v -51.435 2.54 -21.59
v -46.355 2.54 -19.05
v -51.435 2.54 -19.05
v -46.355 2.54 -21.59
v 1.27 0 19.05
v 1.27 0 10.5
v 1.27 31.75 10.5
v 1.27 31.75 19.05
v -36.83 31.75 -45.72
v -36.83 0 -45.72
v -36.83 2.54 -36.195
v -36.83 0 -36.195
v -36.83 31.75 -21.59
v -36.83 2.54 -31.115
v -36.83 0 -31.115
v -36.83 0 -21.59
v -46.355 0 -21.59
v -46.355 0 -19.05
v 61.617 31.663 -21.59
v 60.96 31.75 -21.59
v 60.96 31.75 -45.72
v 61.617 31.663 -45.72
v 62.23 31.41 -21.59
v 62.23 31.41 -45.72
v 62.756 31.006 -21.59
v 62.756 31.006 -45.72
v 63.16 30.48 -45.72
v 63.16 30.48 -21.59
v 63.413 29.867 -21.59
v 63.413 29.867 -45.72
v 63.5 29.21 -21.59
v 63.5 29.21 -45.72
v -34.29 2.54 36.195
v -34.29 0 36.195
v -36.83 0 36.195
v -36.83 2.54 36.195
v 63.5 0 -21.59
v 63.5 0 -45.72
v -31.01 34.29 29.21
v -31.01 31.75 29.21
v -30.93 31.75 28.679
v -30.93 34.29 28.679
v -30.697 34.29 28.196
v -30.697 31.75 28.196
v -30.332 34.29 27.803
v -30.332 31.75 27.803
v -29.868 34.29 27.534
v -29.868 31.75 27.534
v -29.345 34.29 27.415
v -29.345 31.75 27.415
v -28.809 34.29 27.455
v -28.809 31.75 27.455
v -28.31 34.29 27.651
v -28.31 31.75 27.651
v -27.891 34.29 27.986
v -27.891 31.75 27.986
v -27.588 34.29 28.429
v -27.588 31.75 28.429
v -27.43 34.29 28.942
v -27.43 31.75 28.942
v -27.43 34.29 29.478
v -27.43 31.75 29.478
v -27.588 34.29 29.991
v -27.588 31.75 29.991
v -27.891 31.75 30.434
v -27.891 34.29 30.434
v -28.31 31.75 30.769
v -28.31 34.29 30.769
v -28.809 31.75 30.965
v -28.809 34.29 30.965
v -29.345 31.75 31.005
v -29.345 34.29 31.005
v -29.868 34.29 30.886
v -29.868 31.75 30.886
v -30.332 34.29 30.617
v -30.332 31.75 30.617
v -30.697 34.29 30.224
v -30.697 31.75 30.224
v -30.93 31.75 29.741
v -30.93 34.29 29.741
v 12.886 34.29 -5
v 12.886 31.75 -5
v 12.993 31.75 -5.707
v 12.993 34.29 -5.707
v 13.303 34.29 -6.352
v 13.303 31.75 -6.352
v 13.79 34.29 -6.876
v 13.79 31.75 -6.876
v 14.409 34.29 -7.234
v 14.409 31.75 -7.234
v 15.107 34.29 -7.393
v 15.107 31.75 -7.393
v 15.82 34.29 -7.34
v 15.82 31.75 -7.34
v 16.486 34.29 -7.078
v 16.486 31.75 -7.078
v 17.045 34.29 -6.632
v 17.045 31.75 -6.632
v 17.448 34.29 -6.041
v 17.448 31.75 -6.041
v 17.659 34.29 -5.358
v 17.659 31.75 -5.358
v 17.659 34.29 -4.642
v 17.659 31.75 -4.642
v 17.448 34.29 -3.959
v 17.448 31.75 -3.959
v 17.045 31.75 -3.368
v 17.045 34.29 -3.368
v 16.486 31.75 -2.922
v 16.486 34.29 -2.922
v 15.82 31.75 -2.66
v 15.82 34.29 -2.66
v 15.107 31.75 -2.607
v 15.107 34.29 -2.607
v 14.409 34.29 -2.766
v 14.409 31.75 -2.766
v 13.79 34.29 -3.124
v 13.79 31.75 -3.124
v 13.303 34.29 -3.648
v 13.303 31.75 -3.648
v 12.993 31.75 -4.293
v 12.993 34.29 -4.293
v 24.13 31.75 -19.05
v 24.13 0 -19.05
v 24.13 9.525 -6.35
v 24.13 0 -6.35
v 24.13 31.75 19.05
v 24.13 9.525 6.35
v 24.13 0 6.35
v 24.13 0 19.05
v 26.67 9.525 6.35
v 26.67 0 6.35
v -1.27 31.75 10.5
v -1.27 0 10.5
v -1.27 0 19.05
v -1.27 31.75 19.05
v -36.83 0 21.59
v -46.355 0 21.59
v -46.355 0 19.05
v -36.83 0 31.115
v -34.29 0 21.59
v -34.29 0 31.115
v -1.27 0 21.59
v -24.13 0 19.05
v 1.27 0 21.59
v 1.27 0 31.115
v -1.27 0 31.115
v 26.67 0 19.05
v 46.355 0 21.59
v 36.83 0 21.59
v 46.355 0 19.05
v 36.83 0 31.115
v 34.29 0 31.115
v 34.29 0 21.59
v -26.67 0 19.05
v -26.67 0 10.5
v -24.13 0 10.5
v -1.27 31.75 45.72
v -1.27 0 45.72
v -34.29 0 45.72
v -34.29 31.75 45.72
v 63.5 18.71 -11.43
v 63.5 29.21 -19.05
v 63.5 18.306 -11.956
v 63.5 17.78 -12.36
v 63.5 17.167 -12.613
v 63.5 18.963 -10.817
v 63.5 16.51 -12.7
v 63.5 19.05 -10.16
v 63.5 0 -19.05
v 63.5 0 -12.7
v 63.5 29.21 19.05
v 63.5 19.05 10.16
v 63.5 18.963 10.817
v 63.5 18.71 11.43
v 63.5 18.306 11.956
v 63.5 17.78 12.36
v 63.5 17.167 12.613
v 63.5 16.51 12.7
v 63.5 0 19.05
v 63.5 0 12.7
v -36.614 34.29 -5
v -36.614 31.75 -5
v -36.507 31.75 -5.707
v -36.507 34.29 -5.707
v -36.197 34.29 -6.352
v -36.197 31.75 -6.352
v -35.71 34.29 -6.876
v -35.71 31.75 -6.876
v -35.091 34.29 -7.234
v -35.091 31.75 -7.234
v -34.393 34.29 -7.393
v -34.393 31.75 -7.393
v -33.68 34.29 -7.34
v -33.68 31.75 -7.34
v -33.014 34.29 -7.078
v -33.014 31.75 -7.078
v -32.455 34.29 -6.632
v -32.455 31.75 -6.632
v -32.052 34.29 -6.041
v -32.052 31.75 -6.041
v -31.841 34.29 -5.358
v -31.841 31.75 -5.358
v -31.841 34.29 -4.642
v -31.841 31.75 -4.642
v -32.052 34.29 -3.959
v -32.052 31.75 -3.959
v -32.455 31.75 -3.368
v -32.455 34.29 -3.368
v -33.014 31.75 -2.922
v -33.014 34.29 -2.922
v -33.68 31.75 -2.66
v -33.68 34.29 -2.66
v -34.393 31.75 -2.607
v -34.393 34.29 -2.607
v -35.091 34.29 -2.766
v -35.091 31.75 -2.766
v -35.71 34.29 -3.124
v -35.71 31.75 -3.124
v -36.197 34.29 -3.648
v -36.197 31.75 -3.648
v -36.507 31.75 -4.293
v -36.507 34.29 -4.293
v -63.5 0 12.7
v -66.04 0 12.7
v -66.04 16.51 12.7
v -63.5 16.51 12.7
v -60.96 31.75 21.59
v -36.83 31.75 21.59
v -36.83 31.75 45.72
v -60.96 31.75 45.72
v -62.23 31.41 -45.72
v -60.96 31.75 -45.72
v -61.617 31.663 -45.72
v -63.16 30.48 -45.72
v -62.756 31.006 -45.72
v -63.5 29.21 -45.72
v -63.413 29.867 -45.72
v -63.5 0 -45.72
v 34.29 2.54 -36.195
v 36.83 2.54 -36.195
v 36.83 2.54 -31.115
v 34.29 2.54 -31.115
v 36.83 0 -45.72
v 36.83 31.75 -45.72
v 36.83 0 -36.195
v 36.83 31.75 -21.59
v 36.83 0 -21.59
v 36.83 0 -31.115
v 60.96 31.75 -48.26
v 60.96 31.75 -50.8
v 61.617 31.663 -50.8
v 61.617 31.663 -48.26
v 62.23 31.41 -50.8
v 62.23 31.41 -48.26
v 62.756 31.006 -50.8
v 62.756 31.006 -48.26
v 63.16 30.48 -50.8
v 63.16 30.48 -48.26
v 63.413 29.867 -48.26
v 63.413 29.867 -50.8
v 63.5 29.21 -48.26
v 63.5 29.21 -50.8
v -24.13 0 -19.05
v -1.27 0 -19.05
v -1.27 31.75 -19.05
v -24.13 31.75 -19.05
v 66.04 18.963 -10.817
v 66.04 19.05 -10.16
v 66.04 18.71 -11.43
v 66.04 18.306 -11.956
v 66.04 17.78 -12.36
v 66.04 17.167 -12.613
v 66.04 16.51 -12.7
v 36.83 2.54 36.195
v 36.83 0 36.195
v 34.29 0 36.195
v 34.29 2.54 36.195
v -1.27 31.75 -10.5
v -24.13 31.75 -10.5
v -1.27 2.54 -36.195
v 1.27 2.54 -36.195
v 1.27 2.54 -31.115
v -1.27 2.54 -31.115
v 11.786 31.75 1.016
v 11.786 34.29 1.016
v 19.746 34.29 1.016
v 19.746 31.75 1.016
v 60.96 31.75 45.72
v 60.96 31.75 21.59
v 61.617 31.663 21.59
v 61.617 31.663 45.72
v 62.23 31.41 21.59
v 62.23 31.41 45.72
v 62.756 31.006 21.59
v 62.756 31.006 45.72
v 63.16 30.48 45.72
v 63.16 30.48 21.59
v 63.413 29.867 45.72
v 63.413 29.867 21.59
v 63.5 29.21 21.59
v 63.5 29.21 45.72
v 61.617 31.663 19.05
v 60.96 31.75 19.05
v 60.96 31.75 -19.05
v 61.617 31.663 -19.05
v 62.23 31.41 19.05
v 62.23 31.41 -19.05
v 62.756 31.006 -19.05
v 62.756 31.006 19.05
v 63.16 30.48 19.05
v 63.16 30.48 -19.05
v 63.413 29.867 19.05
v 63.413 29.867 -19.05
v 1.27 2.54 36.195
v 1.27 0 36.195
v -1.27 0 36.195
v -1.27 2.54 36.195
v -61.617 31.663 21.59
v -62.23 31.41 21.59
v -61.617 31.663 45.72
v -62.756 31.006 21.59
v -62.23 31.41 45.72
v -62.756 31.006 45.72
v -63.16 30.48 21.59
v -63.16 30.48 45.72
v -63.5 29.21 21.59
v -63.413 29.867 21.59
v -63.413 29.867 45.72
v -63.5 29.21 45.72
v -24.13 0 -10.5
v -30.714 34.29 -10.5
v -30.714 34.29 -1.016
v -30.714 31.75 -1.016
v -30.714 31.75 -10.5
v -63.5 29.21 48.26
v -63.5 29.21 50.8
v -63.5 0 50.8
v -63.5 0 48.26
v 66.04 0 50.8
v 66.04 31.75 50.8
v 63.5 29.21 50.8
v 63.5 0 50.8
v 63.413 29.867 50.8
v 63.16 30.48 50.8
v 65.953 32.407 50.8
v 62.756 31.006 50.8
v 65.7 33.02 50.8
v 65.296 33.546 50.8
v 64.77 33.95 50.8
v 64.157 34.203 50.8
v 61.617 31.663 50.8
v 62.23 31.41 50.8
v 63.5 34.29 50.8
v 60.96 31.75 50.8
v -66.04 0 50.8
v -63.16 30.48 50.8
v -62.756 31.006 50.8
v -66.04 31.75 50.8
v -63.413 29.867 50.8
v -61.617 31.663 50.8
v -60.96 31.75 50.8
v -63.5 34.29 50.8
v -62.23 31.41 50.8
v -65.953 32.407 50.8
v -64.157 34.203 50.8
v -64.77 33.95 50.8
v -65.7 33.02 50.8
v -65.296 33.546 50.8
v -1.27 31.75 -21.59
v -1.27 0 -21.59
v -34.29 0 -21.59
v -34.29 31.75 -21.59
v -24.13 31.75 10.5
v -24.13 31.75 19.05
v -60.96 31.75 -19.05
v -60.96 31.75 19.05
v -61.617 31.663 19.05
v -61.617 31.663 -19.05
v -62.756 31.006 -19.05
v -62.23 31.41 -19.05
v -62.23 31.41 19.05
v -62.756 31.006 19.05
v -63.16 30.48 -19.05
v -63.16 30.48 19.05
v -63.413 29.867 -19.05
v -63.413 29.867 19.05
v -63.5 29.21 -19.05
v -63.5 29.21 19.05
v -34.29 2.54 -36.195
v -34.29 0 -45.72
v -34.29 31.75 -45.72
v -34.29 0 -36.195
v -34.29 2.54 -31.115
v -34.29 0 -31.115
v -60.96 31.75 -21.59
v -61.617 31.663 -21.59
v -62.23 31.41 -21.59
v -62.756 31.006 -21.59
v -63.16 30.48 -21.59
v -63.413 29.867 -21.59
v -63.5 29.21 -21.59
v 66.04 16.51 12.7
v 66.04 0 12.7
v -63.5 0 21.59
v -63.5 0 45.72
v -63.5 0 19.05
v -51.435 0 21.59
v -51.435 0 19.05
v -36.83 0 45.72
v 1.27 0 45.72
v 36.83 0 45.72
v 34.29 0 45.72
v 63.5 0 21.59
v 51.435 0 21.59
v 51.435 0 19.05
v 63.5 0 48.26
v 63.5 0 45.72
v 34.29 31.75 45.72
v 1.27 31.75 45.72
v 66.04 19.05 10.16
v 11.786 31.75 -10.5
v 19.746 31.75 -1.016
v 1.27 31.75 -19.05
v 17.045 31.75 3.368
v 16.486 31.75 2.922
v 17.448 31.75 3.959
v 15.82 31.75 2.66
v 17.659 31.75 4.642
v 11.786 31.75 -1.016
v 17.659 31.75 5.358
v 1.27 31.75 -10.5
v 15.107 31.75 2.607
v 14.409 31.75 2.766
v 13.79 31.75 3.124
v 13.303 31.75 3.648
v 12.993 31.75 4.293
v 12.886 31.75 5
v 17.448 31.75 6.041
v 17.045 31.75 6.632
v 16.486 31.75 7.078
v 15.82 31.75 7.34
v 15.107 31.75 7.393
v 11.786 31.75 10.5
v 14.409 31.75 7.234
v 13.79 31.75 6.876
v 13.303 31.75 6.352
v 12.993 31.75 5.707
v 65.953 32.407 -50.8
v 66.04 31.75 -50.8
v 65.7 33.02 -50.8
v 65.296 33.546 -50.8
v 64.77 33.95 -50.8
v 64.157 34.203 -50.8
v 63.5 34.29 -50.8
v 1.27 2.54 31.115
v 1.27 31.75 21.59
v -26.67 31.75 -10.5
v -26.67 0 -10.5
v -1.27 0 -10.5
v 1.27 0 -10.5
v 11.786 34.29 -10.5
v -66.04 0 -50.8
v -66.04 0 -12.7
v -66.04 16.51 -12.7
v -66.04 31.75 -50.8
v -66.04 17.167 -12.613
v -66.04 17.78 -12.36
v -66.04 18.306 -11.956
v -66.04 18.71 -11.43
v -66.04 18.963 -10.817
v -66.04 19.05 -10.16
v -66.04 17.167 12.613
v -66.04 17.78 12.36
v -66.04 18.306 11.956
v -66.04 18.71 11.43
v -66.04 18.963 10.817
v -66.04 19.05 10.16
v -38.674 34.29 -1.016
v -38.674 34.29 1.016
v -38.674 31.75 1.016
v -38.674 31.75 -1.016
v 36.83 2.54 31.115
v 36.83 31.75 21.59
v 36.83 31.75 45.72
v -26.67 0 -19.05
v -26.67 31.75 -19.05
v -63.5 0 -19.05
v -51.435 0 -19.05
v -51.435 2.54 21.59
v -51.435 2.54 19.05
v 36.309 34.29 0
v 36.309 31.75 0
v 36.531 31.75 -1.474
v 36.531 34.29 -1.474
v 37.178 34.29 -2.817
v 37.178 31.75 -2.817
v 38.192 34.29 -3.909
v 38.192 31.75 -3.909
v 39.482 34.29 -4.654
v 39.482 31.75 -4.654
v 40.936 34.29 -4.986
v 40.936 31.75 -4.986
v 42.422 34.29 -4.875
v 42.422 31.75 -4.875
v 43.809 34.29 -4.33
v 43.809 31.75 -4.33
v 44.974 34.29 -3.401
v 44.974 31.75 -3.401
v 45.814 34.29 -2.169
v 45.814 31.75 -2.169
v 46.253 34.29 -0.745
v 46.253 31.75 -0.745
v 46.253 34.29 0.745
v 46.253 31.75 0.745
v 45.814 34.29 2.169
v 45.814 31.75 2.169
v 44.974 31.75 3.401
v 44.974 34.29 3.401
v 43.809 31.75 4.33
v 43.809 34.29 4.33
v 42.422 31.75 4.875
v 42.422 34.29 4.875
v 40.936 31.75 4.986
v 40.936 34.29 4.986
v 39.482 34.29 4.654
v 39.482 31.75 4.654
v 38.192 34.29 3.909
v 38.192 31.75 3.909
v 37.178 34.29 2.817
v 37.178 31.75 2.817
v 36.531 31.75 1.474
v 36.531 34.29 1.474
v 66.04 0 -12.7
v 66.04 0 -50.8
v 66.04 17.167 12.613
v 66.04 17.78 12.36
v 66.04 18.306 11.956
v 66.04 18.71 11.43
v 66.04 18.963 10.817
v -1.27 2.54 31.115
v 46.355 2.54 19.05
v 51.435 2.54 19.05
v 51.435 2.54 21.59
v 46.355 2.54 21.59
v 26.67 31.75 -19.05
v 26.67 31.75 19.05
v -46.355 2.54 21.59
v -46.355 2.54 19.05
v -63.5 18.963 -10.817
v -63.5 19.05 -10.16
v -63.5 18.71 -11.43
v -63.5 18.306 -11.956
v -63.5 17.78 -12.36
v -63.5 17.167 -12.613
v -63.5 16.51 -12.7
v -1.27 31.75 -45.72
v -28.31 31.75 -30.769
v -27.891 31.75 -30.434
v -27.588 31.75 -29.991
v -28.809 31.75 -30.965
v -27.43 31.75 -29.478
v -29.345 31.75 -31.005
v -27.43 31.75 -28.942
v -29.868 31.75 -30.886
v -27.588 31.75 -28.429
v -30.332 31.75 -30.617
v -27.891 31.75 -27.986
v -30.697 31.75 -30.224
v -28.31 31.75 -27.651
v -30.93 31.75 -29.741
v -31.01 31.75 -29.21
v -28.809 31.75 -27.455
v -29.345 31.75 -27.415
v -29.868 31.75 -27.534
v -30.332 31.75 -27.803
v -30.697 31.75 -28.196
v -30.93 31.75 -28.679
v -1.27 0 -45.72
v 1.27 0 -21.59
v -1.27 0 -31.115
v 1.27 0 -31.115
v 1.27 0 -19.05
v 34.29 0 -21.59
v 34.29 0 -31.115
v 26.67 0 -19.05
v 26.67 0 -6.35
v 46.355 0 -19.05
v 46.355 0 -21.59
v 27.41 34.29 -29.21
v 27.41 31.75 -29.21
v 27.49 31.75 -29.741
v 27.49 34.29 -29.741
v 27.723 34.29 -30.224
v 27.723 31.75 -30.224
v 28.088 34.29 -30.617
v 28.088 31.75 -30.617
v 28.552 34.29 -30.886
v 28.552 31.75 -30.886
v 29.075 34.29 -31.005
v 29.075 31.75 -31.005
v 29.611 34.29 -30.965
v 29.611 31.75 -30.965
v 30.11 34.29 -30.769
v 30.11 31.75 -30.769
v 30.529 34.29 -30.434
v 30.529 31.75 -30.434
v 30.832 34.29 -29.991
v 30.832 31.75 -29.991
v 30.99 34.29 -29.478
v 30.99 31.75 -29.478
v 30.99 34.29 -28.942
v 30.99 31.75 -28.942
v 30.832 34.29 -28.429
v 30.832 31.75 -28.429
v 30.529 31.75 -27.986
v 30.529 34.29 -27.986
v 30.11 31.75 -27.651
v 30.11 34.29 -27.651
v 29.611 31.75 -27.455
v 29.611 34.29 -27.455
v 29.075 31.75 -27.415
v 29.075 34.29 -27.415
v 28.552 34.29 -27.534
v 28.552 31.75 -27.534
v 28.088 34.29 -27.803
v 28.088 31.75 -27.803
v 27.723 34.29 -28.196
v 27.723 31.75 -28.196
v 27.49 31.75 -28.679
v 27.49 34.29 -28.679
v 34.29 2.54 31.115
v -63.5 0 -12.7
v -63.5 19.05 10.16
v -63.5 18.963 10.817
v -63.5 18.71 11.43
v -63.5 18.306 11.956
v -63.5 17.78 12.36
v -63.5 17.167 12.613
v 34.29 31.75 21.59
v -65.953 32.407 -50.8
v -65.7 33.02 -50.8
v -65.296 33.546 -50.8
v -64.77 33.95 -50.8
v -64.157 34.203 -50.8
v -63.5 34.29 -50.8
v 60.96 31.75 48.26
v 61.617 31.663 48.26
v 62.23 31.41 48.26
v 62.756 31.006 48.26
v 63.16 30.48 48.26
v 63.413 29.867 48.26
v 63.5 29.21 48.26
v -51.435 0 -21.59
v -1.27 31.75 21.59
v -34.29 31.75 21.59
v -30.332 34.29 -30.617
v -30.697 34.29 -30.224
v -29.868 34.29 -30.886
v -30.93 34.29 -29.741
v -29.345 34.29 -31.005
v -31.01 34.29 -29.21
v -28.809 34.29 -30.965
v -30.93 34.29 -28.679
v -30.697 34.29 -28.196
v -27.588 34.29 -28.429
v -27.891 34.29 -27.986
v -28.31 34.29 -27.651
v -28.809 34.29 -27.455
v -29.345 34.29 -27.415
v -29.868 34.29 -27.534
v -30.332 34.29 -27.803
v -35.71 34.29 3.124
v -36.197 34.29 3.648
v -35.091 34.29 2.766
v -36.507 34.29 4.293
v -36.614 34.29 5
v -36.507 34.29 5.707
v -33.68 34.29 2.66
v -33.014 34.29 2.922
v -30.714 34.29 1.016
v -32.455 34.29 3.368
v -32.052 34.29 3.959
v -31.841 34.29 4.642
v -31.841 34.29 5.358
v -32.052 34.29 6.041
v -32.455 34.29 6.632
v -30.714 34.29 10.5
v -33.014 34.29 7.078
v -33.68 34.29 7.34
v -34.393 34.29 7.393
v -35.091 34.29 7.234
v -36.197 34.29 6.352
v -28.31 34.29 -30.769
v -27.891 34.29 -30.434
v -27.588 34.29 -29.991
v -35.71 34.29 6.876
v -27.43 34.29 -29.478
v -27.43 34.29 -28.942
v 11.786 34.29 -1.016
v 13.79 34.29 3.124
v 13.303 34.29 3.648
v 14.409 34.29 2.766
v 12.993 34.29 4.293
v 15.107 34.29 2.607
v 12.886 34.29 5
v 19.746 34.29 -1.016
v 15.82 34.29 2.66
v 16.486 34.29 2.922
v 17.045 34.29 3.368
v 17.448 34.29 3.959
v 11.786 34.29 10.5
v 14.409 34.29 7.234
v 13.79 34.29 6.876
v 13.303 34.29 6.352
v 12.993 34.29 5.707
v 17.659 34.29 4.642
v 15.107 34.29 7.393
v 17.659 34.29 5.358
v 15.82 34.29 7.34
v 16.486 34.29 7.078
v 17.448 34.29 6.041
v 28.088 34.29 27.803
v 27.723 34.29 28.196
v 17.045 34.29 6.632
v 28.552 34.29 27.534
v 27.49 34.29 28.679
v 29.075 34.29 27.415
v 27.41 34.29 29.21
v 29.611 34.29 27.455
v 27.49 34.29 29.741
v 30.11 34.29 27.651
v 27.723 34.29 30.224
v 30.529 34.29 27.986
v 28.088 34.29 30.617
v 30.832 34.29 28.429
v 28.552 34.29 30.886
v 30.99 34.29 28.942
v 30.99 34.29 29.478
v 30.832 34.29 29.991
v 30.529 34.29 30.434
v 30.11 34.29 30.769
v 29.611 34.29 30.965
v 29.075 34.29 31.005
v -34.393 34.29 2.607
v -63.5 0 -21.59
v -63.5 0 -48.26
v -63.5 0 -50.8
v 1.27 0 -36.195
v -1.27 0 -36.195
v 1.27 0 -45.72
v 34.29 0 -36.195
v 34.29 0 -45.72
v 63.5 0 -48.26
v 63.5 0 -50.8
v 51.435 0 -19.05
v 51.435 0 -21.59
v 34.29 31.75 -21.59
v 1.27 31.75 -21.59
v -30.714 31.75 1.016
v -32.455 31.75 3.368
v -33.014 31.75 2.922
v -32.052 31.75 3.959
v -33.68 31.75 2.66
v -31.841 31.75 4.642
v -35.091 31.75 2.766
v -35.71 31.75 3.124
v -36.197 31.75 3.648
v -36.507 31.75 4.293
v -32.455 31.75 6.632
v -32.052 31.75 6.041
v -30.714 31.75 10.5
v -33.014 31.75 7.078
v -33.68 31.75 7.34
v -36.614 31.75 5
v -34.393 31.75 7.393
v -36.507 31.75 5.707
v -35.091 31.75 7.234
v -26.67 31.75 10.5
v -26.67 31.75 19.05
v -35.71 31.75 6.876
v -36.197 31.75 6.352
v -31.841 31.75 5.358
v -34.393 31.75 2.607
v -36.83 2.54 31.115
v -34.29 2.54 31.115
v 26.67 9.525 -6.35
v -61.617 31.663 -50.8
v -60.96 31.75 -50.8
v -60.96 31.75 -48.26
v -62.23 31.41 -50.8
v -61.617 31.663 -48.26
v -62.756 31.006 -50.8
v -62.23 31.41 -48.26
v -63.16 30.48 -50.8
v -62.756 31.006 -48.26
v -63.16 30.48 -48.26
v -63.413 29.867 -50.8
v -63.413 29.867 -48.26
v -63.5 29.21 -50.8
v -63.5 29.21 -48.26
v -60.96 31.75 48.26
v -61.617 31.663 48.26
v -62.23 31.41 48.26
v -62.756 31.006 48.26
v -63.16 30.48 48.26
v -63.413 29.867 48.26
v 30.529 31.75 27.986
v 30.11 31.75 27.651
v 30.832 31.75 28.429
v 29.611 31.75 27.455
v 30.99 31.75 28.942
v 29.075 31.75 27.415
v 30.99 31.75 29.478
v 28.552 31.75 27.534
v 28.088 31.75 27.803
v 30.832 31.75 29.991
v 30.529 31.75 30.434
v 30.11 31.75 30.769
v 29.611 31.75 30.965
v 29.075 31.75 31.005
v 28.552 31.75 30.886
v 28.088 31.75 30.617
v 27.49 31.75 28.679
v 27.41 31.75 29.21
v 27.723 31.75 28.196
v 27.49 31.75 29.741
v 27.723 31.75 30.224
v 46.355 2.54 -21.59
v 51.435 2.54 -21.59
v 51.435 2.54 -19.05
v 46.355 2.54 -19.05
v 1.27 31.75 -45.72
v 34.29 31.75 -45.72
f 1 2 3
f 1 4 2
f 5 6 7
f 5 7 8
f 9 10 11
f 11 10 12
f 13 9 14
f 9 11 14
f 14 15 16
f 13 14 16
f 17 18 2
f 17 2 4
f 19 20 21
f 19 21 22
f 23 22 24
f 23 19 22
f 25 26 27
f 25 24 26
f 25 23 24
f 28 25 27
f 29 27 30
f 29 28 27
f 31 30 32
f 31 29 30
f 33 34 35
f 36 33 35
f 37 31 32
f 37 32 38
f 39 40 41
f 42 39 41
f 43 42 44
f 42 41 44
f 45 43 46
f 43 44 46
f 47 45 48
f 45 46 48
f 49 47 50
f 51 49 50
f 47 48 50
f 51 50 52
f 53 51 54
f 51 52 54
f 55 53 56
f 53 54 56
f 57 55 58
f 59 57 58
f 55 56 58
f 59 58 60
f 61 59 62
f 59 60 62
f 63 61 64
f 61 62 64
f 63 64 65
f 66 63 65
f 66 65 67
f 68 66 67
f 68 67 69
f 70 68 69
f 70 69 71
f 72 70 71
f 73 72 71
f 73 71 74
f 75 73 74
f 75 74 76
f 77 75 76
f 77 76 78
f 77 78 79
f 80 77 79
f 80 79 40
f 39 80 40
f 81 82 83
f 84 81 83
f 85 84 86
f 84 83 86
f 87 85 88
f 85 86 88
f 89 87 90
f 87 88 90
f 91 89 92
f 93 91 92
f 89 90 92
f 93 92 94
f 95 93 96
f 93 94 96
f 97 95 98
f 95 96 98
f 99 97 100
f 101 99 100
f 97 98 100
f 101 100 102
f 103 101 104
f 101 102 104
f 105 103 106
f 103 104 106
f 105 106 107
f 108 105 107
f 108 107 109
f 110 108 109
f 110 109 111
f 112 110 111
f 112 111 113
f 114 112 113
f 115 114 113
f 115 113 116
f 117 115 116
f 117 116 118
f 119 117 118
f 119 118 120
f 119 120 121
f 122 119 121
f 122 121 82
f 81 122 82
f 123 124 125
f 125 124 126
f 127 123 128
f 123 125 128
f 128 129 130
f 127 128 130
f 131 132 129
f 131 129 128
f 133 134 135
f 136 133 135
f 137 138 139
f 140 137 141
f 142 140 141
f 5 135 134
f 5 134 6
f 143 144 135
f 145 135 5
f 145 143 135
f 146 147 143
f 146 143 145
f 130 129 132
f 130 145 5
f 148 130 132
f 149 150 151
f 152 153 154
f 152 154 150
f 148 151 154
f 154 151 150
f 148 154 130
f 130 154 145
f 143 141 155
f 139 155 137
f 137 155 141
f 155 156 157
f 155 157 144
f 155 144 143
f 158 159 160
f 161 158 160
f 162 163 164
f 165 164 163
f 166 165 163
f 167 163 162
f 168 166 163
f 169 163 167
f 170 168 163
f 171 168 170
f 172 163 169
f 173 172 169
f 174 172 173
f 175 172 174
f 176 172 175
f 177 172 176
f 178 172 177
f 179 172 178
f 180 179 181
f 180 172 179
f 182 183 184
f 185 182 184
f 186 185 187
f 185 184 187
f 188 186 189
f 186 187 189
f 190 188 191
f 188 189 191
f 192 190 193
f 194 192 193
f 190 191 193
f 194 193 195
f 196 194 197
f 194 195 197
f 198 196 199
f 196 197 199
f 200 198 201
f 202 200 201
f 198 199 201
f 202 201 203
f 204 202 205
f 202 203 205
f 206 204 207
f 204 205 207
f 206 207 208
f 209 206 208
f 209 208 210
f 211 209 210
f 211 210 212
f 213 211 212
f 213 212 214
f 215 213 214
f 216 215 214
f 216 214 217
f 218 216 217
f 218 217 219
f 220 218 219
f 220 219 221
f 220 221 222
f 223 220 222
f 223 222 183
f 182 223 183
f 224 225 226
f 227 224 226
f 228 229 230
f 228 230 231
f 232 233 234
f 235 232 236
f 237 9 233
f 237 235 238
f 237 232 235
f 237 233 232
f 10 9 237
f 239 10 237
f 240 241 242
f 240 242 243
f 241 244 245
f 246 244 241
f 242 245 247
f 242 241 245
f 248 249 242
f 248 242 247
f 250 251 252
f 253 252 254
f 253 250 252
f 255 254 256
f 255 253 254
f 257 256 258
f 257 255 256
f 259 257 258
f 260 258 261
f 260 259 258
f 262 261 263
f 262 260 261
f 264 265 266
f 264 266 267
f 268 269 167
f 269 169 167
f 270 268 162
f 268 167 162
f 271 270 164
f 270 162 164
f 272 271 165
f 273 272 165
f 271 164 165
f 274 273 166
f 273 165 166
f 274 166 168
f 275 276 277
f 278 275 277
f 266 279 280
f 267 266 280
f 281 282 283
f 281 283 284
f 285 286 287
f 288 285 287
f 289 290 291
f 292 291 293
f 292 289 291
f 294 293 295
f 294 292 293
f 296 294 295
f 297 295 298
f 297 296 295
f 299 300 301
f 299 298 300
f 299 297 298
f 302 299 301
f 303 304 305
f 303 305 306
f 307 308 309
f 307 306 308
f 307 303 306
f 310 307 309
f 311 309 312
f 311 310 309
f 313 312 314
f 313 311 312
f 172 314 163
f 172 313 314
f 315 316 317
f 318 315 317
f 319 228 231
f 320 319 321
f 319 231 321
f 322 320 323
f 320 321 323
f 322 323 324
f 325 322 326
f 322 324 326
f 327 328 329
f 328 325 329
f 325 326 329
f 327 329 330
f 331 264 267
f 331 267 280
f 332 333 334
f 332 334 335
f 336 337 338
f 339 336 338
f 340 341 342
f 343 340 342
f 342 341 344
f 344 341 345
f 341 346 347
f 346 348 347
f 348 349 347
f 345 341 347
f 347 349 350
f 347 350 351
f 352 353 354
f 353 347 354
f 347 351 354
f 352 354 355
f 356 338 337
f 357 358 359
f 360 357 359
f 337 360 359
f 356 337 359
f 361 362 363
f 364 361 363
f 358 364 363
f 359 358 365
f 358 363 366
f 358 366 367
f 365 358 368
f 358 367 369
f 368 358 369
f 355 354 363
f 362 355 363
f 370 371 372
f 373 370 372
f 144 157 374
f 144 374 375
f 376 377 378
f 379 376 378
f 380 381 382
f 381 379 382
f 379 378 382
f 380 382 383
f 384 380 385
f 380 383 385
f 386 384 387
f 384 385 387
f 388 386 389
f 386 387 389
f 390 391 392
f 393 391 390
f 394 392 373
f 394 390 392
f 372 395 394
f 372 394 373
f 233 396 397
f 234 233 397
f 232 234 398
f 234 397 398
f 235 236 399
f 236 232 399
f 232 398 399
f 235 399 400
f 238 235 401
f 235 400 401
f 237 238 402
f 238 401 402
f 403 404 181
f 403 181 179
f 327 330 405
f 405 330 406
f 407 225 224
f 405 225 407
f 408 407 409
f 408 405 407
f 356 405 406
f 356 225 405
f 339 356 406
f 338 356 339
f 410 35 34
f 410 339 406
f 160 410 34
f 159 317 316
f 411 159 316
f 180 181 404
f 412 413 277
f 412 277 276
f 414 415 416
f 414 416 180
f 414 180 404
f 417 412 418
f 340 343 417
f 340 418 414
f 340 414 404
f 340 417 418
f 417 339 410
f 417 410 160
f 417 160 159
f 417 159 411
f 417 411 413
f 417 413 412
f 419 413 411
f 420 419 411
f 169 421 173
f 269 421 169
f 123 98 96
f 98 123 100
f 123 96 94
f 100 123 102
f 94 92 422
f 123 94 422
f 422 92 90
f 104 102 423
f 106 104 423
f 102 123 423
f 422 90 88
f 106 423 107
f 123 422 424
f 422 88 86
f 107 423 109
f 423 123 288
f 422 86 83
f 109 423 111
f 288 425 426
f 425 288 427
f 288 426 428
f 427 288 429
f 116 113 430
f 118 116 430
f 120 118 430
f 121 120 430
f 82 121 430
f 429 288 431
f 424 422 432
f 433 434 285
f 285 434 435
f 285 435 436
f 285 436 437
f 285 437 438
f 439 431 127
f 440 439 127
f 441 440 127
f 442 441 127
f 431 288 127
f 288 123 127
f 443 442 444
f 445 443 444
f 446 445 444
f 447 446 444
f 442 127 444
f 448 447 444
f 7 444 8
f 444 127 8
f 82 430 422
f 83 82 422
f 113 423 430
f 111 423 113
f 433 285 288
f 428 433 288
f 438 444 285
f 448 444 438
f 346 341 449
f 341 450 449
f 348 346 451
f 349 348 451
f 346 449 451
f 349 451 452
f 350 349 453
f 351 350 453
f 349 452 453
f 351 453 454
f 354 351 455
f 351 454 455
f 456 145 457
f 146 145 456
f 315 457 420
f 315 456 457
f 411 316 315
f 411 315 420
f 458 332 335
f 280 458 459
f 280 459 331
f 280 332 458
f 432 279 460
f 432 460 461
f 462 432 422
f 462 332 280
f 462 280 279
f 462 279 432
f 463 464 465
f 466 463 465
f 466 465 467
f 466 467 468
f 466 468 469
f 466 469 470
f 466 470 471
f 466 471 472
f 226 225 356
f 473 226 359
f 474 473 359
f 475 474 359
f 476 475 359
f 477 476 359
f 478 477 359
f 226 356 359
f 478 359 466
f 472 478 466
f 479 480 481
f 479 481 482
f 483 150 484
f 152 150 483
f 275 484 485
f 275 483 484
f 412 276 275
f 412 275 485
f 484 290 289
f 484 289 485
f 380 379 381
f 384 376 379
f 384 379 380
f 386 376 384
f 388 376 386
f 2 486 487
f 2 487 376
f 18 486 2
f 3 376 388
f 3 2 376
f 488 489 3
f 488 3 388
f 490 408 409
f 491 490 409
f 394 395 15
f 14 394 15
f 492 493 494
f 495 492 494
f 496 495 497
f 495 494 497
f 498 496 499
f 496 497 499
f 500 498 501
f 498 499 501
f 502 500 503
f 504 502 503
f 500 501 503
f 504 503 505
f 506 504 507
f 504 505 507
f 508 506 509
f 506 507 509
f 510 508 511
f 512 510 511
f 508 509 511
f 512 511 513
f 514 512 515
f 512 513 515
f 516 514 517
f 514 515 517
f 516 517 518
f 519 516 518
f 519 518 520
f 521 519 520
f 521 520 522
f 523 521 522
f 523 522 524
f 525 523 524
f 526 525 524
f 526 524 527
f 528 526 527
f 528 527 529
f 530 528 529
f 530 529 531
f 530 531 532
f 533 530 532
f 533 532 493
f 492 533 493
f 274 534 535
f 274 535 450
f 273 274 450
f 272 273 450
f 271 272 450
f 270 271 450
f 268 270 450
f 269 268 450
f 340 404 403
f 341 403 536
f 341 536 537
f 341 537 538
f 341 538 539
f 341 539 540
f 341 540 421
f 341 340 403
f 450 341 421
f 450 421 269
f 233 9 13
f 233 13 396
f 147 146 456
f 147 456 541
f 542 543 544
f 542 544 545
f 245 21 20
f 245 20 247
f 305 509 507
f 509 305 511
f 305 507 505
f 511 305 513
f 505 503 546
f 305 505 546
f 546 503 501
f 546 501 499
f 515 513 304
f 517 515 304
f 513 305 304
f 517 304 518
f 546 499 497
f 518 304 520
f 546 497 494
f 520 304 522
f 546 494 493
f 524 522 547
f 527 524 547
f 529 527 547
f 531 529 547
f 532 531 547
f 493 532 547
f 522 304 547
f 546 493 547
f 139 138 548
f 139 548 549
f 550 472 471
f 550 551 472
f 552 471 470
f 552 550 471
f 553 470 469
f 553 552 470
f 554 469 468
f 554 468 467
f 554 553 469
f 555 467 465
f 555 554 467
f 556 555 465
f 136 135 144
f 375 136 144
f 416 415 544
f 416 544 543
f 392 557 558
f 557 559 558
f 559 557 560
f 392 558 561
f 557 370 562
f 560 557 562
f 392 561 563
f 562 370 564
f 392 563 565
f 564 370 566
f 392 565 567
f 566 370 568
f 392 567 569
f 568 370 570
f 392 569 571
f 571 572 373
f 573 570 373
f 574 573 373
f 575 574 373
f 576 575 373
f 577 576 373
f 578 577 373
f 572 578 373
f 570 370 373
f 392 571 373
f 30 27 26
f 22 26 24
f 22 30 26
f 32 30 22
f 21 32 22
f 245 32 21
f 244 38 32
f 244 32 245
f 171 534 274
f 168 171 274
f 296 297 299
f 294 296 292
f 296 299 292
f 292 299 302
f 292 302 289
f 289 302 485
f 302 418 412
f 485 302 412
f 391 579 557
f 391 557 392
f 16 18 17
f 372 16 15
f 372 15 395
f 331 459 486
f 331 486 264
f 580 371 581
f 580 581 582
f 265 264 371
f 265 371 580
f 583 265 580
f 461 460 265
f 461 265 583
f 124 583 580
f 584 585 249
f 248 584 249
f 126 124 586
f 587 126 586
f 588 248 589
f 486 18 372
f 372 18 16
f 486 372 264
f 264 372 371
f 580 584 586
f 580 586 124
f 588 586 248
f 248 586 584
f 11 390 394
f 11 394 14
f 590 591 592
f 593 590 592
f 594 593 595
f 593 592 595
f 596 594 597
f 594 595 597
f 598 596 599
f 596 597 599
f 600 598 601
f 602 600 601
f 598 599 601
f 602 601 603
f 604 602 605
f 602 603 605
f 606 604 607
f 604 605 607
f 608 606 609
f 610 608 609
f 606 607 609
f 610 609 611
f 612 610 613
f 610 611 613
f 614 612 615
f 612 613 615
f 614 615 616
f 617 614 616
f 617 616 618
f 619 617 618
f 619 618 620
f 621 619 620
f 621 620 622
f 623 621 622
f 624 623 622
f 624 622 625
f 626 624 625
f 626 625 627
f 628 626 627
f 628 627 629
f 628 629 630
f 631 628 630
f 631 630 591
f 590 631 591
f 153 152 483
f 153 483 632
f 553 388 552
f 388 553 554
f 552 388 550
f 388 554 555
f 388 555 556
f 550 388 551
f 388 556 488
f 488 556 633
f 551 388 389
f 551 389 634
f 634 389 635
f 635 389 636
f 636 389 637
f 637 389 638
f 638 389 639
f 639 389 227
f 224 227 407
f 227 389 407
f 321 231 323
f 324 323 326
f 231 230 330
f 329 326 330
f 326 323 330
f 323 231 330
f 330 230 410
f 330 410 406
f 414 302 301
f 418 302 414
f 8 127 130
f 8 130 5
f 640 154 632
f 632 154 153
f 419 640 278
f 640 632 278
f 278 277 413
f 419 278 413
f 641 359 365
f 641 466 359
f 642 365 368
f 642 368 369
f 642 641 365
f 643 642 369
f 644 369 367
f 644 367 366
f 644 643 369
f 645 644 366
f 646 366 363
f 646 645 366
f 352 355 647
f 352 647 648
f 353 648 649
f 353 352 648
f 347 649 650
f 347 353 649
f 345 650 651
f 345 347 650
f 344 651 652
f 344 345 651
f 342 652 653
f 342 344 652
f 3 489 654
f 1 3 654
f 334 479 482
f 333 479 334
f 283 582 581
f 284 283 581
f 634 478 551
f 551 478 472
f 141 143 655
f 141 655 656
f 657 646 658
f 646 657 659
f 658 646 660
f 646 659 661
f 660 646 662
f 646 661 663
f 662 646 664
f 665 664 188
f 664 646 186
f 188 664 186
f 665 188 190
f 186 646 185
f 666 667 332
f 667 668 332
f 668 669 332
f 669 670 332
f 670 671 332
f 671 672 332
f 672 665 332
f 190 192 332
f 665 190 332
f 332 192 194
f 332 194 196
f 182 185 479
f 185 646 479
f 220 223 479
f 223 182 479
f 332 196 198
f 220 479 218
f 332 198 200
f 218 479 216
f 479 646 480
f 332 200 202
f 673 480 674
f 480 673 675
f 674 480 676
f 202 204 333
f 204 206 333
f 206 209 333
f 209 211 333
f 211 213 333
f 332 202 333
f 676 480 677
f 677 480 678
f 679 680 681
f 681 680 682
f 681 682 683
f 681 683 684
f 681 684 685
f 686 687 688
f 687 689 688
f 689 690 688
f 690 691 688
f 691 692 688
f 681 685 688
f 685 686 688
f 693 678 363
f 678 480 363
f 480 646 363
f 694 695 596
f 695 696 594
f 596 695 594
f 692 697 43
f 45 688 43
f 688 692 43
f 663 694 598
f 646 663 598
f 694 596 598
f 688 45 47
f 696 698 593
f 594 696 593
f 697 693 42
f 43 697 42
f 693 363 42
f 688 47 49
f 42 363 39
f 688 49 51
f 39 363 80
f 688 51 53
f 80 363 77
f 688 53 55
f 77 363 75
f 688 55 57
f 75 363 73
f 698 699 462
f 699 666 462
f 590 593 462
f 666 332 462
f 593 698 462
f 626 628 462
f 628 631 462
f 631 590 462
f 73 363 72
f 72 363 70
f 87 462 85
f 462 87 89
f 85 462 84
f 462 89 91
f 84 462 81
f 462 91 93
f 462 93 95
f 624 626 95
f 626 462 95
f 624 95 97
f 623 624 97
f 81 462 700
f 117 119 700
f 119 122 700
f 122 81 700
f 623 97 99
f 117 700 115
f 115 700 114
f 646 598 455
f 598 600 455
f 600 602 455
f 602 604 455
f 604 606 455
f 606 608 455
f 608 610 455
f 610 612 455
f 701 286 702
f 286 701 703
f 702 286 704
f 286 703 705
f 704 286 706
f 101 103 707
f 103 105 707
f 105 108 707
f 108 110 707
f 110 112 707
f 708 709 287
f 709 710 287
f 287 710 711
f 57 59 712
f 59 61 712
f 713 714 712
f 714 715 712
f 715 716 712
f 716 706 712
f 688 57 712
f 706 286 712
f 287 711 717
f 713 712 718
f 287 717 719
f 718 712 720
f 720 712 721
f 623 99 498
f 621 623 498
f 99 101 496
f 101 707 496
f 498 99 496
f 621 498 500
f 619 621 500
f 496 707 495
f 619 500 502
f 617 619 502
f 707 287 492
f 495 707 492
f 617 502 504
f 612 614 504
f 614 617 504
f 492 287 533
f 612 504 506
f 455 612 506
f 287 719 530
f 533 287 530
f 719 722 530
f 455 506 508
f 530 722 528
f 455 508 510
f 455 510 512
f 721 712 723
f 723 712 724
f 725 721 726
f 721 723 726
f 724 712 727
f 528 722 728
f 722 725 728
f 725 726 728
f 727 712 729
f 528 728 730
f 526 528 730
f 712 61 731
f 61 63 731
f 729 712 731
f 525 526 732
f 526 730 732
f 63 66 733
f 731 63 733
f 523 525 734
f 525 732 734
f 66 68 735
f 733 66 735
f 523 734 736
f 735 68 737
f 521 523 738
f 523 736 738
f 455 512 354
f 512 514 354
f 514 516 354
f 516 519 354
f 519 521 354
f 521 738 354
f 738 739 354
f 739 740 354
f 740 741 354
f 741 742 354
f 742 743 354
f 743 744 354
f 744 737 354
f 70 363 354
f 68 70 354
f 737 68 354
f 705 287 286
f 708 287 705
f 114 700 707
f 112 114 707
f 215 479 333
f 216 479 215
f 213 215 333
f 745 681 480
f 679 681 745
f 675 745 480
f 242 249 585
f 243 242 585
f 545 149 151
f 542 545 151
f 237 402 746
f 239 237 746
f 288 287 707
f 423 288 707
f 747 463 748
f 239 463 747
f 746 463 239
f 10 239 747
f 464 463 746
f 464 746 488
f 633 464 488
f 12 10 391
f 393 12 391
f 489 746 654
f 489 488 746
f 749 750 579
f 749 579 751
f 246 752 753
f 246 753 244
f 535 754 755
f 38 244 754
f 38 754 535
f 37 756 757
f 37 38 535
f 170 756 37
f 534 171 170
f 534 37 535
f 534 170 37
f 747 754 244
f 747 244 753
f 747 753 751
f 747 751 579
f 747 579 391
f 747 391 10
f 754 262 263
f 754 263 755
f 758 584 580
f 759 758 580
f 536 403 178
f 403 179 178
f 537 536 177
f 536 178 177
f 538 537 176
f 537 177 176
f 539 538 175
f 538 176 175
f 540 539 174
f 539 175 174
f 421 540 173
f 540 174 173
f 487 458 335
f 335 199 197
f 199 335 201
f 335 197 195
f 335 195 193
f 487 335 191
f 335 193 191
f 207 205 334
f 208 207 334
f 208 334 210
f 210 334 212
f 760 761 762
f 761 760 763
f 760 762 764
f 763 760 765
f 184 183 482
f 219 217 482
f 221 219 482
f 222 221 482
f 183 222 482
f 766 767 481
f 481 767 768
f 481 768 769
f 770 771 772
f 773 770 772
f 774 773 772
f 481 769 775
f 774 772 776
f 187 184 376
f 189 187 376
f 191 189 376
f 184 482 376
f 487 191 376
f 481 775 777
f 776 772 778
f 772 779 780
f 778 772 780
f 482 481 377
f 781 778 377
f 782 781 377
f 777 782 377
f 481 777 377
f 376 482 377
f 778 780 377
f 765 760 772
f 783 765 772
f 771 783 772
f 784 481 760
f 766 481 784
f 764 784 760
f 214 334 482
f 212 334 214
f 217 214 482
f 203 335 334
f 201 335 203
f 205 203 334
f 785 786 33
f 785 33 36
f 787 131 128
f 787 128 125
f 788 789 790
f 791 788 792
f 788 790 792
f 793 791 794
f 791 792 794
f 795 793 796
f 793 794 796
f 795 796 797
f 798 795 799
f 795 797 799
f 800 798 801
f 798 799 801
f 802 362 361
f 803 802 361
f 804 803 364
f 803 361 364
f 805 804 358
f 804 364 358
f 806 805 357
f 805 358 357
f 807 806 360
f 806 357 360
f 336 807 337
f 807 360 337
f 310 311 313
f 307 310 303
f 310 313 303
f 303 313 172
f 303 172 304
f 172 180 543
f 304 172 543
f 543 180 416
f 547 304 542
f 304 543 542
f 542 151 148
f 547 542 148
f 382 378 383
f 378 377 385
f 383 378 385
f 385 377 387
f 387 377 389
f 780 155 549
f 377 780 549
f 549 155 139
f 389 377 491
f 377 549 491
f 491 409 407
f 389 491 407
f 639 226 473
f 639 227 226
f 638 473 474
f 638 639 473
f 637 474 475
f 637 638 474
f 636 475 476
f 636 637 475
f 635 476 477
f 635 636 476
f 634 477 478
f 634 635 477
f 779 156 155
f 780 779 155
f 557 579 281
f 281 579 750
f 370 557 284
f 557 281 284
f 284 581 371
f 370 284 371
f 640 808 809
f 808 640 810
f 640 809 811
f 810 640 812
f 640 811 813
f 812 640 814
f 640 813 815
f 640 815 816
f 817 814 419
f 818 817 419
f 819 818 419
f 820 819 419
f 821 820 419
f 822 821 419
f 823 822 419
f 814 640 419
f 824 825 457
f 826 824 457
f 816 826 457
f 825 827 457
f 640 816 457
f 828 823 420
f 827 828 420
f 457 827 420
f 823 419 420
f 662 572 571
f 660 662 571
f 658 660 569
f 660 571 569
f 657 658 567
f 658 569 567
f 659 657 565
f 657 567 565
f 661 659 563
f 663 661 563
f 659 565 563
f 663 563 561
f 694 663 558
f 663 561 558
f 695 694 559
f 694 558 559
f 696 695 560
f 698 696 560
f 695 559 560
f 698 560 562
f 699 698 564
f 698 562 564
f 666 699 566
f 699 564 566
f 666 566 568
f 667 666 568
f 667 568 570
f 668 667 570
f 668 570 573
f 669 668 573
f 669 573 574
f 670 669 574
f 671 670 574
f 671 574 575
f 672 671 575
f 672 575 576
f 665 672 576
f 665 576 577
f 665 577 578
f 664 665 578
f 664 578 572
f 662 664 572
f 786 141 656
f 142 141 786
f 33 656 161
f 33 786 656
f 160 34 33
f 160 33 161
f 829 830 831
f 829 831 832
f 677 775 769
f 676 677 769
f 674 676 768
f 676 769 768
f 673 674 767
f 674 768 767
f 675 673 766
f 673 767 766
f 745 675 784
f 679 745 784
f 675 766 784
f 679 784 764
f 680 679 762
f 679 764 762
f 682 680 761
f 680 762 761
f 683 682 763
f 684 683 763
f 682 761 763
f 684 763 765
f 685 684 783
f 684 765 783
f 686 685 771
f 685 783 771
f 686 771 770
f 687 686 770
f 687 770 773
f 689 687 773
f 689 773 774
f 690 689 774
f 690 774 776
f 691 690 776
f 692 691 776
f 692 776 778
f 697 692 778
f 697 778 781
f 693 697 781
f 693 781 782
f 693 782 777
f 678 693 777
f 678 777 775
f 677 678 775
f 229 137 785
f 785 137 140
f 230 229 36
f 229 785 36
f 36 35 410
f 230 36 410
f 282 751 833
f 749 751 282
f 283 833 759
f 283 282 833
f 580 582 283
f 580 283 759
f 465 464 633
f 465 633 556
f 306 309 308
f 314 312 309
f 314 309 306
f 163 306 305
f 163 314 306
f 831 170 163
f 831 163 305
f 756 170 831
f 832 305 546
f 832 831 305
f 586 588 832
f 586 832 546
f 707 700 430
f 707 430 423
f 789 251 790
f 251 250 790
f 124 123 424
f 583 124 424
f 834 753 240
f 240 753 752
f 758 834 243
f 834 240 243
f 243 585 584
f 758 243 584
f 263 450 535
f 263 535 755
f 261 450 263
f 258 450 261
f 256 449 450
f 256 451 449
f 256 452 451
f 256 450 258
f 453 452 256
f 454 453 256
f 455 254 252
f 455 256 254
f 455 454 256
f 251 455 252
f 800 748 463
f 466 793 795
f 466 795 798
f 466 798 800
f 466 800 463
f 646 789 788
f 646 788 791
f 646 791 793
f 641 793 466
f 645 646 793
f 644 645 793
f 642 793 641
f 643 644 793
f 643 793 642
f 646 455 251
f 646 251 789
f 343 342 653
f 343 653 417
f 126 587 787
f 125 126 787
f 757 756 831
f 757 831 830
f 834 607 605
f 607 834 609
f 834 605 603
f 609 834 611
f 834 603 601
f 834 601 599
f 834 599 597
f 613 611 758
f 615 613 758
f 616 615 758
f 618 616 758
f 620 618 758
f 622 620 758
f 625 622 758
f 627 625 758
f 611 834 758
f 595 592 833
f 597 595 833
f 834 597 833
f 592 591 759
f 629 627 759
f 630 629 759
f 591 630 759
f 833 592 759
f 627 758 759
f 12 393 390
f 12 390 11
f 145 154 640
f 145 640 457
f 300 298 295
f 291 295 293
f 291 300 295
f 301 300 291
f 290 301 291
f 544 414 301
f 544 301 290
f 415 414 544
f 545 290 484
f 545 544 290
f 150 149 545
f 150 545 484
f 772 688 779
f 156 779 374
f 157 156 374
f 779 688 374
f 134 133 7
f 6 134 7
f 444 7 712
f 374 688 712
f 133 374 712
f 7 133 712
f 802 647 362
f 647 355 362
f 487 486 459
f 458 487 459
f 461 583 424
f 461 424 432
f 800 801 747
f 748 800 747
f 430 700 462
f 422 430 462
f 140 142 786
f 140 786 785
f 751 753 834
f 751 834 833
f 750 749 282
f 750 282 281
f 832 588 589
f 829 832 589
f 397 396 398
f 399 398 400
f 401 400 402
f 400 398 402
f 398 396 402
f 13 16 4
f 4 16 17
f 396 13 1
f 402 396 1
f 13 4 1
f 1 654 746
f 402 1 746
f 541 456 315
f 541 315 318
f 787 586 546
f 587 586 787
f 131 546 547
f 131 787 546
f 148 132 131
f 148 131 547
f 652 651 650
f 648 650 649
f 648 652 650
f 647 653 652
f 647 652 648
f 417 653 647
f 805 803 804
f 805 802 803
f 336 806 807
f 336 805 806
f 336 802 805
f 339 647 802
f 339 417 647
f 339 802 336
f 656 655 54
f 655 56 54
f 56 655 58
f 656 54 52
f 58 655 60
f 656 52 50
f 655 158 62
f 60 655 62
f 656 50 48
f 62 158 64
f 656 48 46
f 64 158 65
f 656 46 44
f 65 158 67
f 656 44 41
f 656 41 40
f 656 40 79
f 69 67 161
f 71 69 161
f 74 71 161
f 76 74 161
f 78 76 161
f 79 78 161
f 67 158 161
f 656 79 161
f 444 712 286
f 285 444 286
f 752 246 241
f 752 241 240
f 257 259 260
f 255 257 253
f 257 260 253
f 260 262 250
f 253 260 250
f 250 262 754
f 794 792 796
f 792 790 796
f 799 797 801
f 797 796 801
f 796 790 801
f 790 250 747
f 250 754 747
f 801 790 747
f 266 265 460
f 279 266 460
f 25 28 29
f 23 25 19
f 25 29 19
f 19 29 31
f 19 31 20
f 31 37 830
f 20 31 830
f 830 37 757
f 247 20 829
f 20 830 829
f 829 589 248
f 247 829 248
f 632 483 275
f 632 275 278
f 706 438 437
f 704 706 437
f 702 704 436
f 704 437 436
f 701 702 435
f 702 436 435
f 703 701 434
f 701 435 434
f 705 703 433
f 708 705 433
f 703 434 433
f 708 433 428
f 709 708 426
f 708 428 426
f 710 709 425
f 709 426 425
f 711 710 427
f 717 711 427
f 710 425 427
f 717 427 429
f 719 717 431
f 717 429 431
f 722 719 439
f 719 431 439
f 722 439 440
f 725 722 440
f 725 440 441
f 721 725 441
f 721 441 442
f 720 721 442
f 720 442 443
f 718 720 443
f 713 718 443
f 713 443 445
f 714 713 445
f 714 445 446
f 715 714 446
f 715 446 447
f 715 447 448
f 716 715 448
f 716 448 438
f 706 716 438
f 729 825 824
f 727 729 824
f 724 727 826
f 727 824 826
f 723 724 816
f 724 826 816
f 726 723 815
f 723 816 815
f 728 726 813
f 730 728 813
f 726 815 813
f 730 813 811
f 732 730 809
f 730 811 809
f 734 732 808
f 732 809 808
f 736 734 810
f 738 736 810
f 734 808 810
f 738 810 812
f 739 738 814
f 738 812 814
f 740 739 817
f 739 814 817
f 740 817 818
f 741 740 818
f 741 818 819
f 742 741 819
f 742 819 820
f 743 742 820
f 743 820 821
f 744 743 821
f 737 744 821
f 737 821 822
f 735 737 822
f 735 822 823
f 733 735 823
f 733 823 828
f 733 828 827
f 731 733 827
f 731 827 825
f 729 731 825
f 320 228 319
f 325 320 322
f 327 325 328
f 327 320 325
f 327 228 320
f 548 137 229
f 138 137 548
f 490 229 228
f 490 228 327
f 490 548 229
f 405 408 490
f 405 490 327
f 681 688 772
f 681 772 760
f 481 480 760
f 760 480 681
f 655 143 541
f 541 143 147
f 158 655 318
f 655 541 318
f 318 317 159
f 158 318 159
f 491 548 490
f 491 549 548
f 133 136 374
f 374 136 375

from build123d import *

# Parameters (mm, degrees)
EXTRUDE_THIN1_DEPTH     = 50.8
CUT_EXTRUDE1_REACH      = 92.098
SKETCH4_W               = 25.4
SKETCH4_H               = 19.05
FILLET1_R               = 2.54
EXTRUDE_THIN2_REACH     = 92.098
SKETCH3_W               = 63.5
SKETCH3_H               = 2.54
SKETCH9_W               = 2.54
SKETCH9_H               = 38.1
SKETCH9_H_2             = 91.44
SKETCH9_H_3             = 24.13
EXTRUDE_THIN3_DEPTH     = 31.75
CUT_EXTRUDE2_REACH      = 92.098
SKETCH5_W               = 42.5
SKETCH5_H               = 21
M4_CLEARANCE_HOLE1_D    = 4.8
CUT_EXTRUDE4_REACH      = 92.098
SKETCH7_W               = 7.96
SKETCH7_H               = 2.032
CUT_EXTRUDE5_REACH      = 113.138
SKETCH10_W              = 12.7
SKETCH10_H              = 9.525
M3_CLEARANCE_HOLE1_D    = 3.6
M8_CLEARANCE_HOLE1_D    = 10
SKETCH19_W              = 102.87
SKETCH19_H              = 72.39
SKETCH19_W_2            = 92.71
SKETCH19_H_2            = 62.23
CUT_EXTRUDE_THIN1_DEPTH = 2.54


# Read off the part's stored shape, not the designer's step: Mirror2
with BuildPart() as part:
    # Sketch2 → Extrude-Thin1 (new, symmetric)
    with BuildSketch(Plane.XY):
        Polygon((0, 31.75), (63.5, 31.75), (63.5, 0), (66.04, 0), (66.04, 34.29), (0, 34.29), align=None)
    extrude(amount=EXTRUDE_THIN1_DEPTH, both=True)

    # Sketch4 → Cut-Extrude1 (cut, up to next)
    with BuildSketch(Plane(origin=(66.04, 0, 0), x_dir=(0, 0, -1), z_dir=(1, 0, 0)), mode=Mode.PRIVATE) as cut_extrude1_sk1:
        with Locations((0, 9.525)):
            Rectangle(SKETCH4_W, SKETCH4_H)
    cut_extrude1_tool1 = extrude(cut_extrude1_sk1.sketch, amount=-CUT_EXTRUDE1_REACH, mode=Mode.PRIVATE) & part.part
    add(cut_extrude1_tool1.solids().sort_by_distance((66.04, 9.525, 0))[0], mode=Mode.SUBTRACT)

    # Fillet1
    fillet1_edges = [part.edges().sort_by_distance(p)[0] for p in [
        (64.77, 19.05, 12.7),
        (64.77, 19.05, -12.7),
        (63.5, 31.75, 0),
        (66.04, 34.29, 0),
    ]]
    fillet(fillet1_edges, radius=FILLET1_R)

    # Sketch3 → Extrude-Thin2 (add, up to next)
    with BuildSketch(Plane.XZ, mode=Mode.PRIVATE) as extrude_thin2_sk1:
        with Locations((31.75, 20.32)):
            Rectangle(SKETCH3_W, SKETCH3_H)
    extrude_thin2_tool1 = extrude(extrude_thin2_sk1.sketch, amount=-EXTRUDE_THIN2_REACH, mode=Mode.PRIVATE) - part.part
    # Sketch3 → Extrude-Thin2 (add, up to next)
    with BuildSketch(Plane.XZ, mode=Mode.PRIVATE) as extrude_thin2_sk2:
        with Locations((31.75, 46.99)):
            Rectangle(SKETCH3_W, SKETCH3_H)
    extrude_thin2_tool2 = extrude(extrude_thin2_sk2.sketch, amount=-EXTRUDE_THIN2_REACH, mode=Mode.PRIVATE) - part.part
    extrude_thin2_1 = extrude_thin2_tool1.solids().sort_by_distance((31.75, 0, 20.32))[0]
    add(extrude_thin2_1)
    extrude_thin2_2 = extrude_thin2_tool2.solids().sort_by_distance((31.75, 0, 46.99))[0]
    add(extrude_thin2_2)
    extrude_thin2 = extrude_thin2_1 + extrude_thin2_2  # Extrude-Thin2 as one shape, for the pattern or mirror that repeats it

    # Mirror1: Extrude-Thin2 across plane
    add(extrude_thin2.mirror(Plane.XY))

    # Mirror2: part across plane


with BuildPart() as part_1:
    add(part.part)
    add(part.part.mirror(Plane(origin=(0, 0, 0), x_dir=(0, 0, 1), z_dir=(1, 0, 0))))

    # Sketch9 → Extrude-Thin3 (add)
    with BuildSketch(Plane.XZ):
        with Locations((-25.4, 0)):
            Rectangle(SKETCH9_W, SKETCH9_H)
        Rectangle(SKETCH9_W, SKETCH9_H_2)
        with Locations((25.4, 0)):
            Rectangle(SKETCH9_W, SKETCH9_H)
        with Locations((-35.56, 33.655)):
            Rectangle(SKETCH9_W, SKETCH9_H_3)
        with Locations((-35.56, -33.655)):
            Rectangle(SKETCH9_W, SKETCH9_H_3)
        with Locations((35.56, 33.655)):
            Rectangle(SKETCH9_W, SKETCH9_H_3)
        with Locations((35.56, -33.655)):
            Rectangle(SKETCH9_W, SKETCH9_H_3)
    extrude(amount=-EXTRUDE_THIN3_DEPTH)

    # Sketch5 → Cut-Extrude2 (cut, up to next)
    with BuildSketch(Plane(origin=(0, 34.29, 0), x_dir=(1, 0, 0), z_dir=(0, 1, 0)), mode=Mode.PRIVATE) as cut_extrude2_sk1:
        with Locations((-9.464, 0)):
            Rectangle(SKETCH5_W, SKETCH5_H)
    cut_extrude2_tool1 = extrude(cut_extrude2_sk1.sketch, amount=-CUT_EXTRUDE2_REACH, mode=Mode.PRIVATE) & part_1.part
    add(cut_extrude2_tool1.solids().sort_by_distance((-9.464, 34.29, 0))[0], mode=Mode.SUBTRACT)

    # M4 Clearance Hole1 (through all)
    with Locations(Plane(origin=(0, 34.29, 0), x_dir=(1, 0, 0), z_dir=(0, 1, 0))):
        with Locations((15.286, -5), (15.286, 5), (-34.214, 5), (-34.214, -5)):
            Hole(M4_CLEARANCE_HOLE1_D / 2)

    # Sketch7 → Cut-Extrude4 (cut, up to next)
    with BuildSketch(Plane(origin=(0, 34.29, 0), x_dir=(1, 0, 0), z_dir=(0, 1, 0)), mode=Mode.PRIVATE) as cut_extrude4_sk1:
        with Locations((15.766, 0)):
            Rectangle(SKETCH7_W, SKETCH7_H)
    cut_extrude4_tool1 = extrude(cut_extrude4_sk1.sketch, amount=-CUT_EXTRUDE4_REACH, mode=Mode.PRIVATE) & part_1.part
    # Sketch7 → Cut-Extrude4 (cut, up to next)
    with BuildSketch(Plane(origin=(0, 34.29, 0), x_dir=(1, 0, 0), z_dir=(0, 1, 0)), mode=Mode.PRIVATE) as cut_extrude4_sk2:
        with Locations((-34.694, 0)):
            Rectangle(SKETCH7_W, SKETCH7_H)
    cut_extrude4_tool2 = extrude(cut_extrude4_sk2.sketch, amount=-CUT_EXTRUDE4_REACH, mode=Mode.PRIVATE) & part_1.part
    add(cut_extrude4_tool1.solids().sort_by_distance((15.766, 34.29, 0))[0], mode=Mode.SUBTRACT)
    add(cut_extrude4_tool2.solids().sort_by_distance((-34.694, 34.29, 0))[0], mode=Mode.SUBTRACT)

    # Sketch10 → Cut-Extrude5 (cut, up to next)
    with BuildSketch(Plane(origin=(26.67, 0, 0), x_dir=(0, 0, -1), z_dir=(1, 0, 0)), mode=Mode.PRIVATE) as cut_extrude5_sk1:
        with Locations((0, 4.7625)):
            Rectangle(SKETCH10_W, SKETCH10_H)
    cut_extrude5_tool1 = extrude(cut_extrude5_sk1.sketch, amount=-CUT_EXTRUDE5_REACH, mode=Mode.PRIVATE) & part_1.part
    add(cut_extrude5_tool1.solids().sort_by_distance((26.67, 4.7625, 0))[0], mode=Mode.SUBTRACT)

    # M3 Clearance Hole1 (through all)
    with Locations(Plane(origin=(0, 34.29, 0), x_dir=(1, 0, 0), z_dir=(0, 1, 0))):
        with Locations((-29.21, 29.21), (29.21, 29.21), (29.21, -29.21), (-29.21, -29.21)):
            Hole(M3_CLEARANCE_HOLE1_D / 2)

    # M8 Clearance Hole1 (through all)
    with Locations(Plane(origin=(0, 34.29, 0), x_dir=(1, 0, 0), z_dir=(0, 1, 0))):
        with Locations((41.309178157, 0)):
            Hole(M8_CLEARANCE_HOLE1_D / 2)

    # Sketch19 → Cut-Extrude-Thin1 (cut)
    with BuildSketch(Plane(origin=(0, 0, 0), x_dir=(-1, 0, 0), z_dir=(0, -1, 0))):
        Rectangle(SKETCH19_W, SKETCH19_H)
        Rectangle(SKETCH19_W_2, SKETCH19_H_2, mode=Mode.SUBTRACT)
    extrude(amount=-CUT_EXTRUDE_THIN1_DEPTH, mode=Mode.SUBTRACT)


solid = part_1.part
